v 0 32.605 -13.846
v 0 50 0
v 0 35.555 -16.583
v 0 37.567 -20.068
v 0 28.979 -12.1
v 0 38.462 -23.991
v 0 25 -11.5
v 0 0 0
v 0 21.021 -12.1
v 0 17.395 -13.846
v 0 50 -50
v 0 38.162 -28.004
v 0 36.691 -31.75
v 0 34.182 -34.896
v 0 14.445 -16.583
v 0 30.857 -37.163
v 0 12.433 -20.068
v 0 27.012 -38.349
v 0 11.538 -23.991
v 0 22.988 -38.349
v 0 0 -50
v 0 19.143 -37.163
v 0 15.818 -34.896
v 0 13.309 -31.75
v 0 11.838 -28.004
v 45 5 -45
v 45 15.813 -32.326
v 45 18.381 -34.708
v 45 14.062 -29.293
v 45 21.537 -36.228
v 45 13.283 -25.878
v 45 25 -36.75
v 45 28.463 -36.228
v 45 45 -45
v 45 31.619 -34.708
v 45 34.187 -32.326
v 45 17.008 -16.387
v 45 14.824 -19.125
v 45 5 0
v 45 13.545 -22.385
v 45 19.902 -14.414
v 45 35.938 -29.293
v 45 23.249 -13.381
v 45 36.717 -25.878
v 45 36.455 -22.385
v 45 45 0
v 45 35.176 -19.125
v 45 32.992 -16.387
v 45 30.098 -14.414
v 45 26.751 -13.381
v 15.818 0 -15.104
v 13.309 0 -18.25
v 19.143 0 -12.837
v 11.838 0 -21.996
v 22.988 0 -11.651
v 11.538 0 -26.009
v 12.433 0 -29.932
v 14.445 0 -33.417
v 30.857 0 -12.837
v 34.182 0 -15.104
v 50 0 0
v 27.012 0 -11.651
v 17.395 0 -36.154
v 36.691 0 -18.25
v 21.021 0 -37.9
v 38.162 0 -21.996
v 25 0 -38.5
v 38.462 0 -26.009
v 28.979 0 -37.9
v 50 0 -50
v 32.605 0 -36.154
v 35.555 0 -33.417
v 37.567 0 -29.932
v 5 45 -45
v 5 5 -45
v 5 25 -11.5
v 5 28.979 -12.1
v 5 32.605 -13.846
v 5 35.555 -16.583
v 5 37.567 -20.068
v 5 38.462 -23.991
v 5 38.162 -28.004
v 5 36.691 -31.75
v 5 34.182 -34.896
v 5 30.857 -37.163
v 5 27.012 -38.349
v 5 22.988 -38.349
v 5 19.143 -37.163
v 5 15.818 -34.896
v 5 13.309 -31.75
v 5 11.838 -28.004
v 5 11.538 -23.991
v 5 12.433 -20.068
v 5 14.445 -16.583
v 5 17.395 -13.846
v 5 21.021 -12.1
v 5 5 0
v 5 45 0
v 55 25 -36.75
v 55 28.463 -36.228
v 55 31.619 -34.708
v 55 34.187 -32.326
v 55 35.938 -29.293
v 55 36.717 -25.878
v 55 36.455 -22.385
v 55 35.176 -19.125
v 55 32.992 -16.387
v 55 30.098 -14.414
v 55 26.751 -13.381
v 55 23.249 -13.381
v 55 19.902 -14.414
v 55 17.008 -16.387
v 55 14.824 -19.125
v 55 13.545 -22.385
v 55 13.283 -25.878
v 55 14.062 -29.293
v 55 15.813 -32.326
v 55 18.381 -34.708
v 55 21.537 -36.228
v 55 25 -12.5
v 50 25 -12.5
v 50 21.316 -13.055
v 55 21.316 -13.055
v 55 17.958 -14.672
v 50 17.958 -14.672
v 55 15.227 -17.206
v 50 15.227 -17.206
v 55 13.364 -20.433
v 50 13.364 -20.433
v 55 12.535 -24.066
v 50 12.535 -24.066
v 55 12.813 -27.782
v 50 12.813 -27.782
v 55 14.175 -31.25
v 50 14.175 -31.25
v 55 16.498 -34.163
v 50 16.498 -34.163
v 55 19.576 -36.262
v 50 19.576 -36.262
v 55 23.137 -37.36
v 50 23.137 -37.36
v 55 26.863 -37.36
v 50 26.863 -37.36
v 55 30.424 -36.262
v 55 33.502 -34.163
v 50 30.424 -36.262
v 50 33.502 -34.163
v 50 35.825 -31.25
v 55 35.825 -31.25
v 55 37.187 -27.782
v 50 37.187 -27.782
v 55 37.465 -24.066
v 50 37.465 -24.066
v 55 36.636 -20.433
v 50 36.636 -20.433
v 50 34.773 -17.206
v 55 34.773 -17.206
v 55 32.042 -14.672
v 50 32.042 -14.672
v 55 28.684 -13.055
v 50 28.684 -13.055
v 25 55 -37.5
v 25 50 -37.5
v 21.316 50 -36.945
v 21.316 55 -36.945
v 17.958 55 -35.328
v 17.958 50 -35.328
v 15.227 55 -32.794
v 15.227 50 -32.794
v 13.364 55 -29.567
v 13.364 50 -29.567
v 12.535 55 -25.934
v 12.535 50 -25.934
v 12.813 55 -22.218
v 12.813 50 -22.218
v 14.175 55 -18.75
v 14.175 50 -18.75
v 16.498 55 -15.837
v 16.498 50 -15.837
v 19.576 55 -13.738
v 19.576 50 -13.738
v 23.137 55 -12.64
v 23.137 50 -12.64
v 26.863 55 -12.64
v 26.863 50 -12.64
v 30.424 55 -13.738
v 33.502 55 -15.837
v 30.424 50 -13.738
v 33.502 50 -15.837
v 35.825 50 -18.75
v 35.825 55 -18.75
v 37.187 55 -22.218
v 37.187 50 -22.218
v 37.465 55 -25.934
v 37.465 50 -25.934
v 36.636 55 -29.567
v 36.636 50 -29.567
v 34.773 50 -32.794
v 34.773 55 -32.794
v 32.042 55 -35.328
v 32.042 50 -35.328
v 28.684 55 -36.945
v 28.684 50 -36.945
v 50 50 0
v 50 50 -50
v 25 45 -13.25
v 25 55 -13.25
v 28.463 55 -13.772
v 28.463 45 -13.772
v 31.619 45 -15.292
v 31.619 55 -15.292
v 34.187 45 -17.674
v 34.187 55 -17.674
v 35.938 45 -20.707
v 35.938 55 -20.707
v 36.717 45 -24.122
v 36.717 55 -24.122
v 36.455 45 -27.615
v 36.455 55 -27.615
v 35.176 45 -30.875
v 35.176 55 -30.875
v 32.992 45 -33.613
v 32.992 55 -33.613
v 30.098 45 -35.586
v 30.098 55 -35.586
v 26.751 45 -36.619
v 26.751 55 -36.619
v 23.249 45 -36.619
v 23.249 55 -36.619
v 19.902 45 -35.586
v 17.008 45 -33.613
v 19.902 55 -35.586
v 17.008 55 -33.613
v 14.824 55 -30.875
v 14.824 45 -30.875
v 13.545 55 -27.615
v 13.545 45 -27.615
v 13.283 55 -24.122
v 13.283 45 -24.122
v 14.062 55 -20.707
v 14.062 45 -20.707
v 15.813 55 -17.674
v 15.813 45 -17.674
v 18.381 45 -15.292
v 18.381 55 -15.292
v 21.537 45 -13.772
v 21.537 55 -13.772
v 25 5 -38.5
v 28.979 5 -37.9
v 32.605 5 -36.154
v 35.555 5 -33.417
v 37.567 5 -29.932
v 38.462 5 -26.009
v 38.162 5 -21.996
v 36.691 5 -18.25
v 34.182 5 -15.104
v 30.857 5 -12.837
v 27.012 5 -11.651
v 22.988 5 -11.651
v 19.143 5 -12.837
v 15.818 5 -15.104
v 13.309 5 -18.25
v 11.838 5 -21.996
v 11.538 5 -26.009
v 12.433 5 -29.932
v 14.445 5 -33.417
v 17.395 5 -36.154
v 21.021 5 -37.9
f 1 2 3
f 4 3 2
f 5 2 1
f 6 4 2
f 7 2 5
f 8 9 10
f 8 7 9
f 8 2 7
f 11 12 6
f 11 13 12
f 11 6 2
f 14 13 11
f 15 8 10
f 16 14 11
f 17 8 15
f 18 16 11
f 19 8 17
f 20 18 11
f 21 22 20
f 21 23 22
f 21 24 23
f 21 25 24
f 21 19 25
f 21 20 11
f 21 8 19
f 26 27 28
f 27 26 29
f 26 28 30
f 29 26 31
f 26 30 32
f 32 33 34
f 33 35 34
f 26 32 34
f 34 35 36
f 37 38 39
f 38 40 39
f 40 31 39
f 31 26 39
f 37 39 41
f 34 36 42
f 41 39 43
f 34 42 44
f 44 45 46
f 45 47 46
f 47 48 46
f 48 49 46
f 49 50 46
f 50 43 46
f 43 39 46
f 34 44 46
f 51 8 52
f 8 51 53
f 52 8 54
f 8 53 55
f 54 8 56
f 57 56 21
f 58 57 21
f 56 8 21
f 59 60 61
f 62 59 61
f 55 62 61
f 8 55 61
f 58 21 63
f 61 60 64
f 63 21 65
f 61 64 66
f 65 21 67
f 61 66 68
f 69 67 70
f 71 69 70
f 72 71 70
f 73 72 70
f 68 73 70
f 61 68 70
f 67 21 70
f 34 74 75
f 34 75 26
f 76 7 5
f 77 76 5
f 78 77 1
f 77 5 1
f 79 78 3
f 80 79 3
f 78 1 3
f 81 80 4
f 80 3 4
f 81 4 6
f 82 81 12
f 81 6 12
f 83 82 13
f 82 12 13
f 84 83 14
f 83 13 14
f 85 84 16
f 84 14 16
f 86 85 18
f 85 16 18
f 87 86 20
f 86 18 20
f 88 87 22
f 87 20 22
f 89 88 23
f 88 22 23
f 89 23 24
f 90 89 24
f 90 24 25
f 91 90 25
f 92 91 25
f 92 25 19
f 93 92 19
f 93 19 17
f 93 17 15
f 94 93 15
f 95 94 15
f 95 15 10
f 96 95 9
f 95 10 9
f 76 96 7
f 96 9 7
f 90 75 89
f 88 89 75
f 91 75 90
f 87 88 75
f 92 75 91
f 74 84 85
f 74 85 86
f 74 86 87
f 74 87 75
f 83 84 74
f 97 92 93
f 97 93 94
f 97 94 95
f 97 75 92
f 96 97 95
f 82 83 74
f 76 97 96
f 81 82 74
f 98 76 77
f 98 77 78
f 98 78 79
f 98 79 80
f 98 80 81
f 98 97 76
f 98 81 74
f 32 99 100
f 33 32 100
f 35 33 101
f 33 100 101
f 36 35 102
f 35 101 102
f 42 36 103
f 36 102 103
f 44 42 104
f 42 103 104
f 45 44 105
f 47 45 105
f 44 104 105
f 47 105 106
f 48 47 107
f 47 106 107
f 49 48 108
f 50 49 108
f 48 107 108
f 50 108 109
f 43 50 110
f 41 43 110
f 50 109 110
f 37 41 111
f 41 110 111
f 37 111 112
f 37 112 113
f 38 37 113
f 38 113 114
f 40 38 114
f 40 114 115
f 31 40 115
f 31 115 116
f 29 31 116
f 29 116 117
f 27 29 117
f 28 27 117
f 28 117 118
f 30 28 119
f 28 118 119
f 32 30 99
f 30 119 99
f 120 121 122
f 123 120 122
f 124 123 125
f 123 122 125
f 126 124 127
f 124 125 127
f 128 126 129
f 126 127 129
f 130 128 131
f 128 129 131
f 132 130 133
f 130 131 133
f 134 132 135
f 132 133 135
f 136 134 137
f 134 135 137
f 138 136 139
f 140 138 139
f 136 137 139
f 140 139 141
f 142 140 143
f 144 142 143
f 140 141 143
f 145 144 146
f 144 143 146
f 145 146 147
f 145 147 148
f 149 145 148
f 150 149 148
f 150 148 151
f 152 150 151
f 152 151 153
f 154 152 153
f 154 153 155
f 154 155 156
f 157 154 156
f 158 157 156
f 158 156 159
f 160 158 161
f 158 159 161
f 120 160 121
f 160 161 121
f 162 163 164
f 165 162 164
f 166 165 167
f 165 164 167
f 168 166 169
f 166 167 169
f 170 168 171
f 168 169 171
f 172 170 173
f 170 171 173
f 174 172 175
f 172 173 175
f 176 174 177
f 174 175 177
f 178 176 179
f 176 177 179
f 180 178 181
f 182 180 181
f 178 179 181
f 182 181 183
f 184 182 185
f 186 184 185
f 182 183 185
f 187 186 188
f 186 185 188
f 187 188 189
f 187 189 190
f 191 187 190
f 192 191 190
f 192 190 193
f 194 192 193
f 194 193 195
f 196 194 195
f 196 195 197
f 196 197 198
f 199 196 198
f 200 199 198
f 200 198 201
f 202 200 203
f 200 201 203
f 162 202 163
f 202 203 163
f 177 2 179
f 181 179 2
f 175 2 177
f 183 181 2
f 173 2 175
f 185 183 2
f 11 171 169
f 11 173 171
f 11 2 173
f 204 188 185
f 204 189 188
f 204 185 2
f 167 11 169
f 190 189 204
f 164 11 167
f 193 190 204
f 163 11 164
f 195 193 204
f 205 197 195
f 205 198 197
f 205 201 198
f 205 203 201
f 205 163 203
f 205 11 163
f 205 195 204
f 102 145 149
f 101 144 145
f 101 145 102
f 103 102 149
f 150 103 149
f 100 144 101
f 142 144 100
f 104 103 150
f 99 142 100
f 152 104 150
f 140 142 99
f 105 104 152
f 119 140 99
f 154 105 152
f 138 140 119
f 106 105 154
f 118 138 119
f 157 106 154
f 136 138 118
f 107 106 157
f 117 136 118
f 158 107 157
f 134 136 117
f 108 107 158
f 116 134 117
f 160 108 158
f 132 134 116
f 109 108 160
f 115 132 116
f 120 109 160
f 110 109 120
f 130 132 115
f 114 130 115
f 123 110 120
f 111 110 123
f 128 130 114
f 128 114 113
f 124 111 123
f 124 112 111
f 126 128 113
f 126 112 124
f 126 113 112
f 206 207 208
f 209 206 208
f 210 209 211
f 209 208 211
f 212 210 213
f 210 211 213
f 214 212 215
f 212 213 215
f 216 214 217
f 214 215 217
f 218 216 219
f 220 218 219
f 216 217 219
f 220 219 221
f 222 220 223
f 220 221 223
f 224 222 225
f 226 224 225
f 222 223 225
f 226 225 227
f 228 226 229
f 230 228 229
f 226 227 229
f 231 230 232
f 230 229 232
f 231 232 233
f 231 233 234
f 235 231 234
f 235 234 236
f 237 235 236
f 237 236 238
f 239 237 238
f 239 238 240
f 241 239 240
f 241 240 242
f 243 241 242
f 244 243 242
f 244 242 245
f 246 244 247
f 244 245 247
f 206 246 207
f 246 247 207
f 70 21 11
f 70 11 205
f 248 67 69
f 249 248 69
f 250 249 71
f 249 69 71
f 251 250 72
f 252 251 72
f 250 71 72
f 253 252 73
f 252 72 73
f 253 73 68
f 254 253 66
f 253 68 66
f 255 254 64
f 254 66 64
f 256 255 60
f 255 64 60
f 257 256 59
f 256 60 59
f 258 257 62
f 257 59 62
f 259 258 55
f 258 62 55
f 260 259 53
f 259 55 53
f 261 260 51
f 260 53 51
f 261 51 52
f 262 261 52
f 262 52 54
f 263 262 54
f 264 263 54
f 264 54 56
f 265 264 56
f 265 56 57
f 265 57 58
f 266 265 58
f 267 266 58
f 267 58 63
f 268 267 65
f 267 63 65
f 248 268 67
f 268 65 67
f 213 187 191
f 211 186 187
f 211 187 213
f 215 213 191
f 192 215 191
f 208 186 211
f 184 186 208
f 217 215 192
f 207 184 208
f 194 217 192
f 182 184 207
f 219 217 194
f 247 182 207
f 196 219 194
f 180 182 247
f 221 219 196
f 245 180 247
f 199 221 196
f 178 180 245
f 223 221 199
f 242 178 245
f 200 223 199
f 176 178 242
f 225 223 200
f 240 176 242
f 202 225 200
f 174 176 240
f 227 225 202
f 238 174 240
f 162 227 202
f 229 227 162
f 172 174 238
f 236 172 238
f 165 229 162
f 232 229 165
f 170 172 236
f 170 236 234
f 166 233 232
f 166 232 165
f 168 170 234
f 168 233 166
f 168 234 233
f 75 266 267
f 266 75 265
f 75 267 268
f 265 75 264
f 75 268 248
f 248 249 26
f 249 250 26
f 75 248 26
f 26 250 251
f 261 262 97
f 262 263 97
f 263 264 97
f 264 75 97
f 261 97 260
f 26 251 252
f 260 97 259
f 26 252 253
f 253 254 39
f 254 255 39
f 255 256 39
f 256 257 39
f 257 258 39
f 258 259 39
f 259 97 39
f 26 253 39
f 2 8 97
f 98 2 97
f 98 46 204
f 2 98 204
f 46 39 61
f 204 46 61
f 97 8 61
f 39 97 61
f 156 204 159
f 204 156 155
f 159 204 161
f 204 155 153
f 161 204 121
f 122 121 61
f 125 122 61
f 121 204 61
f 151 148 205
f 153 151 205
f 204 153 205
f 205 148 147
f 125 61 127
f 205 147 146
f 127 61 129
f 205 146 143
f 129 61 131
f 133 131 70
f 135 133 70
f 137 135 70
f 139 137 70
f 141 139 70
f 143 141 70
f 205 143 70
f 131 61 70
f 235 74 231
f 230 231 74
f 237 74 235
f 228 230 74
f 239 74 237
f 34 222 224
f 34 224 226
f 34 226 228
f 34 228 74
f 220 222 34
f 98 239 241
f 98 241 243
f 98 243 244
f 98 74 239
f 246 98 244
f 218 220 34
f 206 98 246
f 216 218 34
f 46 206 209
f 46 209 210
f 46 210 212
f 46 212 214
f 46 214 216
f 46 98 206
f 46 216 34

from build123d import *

# Parameters (mm, degrees)
SKETCH1_W           = 50
SKETCH1_H           = 50
BOSS_EXTRUDE1_DEPTH = 50
SKETCH2_W           = 40
SKETCH2_H           = 40
CUT_EXTRUDE1_DEPTH  = 45
SKETCH3_R           = 12.5
BOSS_EXTRUDE2_DEPTH = 5
SKETCH4_R           = 13.5
CUT_EXTRUDE2_DEPTH  = 5
SKETCH5_R           = 12.5
BOSS_EXTRUDE3_DEPTH = 5
SKETCH6_R           = 13.5
CUT_EXTRUDE3_DEPTH  = 5
SKETCH7_R           = 11.75
CUT_EXTRUDE4_DEPTH  = 10
SKETCH8_R           = 11.75
CUT_EXTRUDE5_DEPTH  = 10


with BuildPart() as part:
    # Sketch1 → Boss-Extrude1 (new body)
    with BuildSketch(Plane(origin=(0, 0, 0), x_dir=(1, 0, 0), z_dir=(0, 1, 0))):
        with Locations((25, 25)):
            Rectangle(SKETCH1_W, SKETCH1_H)
    extrude(amount=BOSS_EXTRUDE1_DEPTH)

    # Sketch2 → Cut-Extrude1 (cut)
    with BuildSketch(Plane.XY):
        with Locations((25, 25)):
            Rectangle(SKETCH2_W, SKETCH2_H)
    extrude(amount=-CUT_EXTRUDE1_DEPTH, mode=Mode.SUBTRACT)

    # Sketch3 → Boss-Extrude2 (add)
    with BuildSketch(Plane(origin=(0, 50, 0), x_dir=(1, 0, 0), z_dir=(0, 1, 0))):
        with Locations(Location((25, 25, 0), (0, 0, 90))):
            Circle(SKETCH3_R)
    extrude(amount=BOSS_EXTRUDE2_DEPTH)

    # Sketch4 → Cut-Extrude2 (cut)
    with BuildSketch(Plane.XZ):
        with Locations(Location((25, -25, 0), (0, 0, 270))):
            Circle(SKETCH4_R)
    extrude(amount=-CUT_EXTRUDE2_DEPTH, mode=Mode.SUBTRACT)

    # Sketch5 → Boss-Extrude3 (add)
    with BuildSketch(Plane(origin=(50, 0, 0), x_dir=(0, 0, -1), z_dir=(1, 0, 0))):
        with Locations(Location((25, 25, 0), (0, 0, 180))):
            Circle(SKETCH5_R)
    extrude(amount=BOSS_EXTRUDE3_DEPTH)

    # Sketch6 → Cut-Extrude3 (cut)
    with BuildSketch(Plane.ZY):
        with Locations((-25, 25)):
            Circle(SKETCH6_R)
    extrude(amount=-CUT_EXTRUDE3_DEPTH, mode=Mode.SUBTRACT)

    # Sketch7 → Cut-Extrude4 (cut)
    with BuildSketch(Plane(origin=(0, 55, 0), x_dir=(1, 0, 0), z_dir=(0, 1, 0))):
        with Locations(Location((25, 25, 0), (0, 0, 270))):
            Circle(SKETCH7_R)
    extrude(amount=-CUT_EXTRUDE4_DEPTH, mode=Mode.SUBTRACT)

    # Sketch8 → Cut-Extrude5 (cut)
    with BuildSketch(Plane(origin=(55, 0, 0), x_dir=(0, 0, -1), z_dir=(1, 0, 0))):
        with Locations((25, 25)):
            Circle(SKETCH8_R)
    extrude(amount=-CUT_EXTRUDE5_DEPTH, mode=Mode.SUBTRACT)


solid = part.part
